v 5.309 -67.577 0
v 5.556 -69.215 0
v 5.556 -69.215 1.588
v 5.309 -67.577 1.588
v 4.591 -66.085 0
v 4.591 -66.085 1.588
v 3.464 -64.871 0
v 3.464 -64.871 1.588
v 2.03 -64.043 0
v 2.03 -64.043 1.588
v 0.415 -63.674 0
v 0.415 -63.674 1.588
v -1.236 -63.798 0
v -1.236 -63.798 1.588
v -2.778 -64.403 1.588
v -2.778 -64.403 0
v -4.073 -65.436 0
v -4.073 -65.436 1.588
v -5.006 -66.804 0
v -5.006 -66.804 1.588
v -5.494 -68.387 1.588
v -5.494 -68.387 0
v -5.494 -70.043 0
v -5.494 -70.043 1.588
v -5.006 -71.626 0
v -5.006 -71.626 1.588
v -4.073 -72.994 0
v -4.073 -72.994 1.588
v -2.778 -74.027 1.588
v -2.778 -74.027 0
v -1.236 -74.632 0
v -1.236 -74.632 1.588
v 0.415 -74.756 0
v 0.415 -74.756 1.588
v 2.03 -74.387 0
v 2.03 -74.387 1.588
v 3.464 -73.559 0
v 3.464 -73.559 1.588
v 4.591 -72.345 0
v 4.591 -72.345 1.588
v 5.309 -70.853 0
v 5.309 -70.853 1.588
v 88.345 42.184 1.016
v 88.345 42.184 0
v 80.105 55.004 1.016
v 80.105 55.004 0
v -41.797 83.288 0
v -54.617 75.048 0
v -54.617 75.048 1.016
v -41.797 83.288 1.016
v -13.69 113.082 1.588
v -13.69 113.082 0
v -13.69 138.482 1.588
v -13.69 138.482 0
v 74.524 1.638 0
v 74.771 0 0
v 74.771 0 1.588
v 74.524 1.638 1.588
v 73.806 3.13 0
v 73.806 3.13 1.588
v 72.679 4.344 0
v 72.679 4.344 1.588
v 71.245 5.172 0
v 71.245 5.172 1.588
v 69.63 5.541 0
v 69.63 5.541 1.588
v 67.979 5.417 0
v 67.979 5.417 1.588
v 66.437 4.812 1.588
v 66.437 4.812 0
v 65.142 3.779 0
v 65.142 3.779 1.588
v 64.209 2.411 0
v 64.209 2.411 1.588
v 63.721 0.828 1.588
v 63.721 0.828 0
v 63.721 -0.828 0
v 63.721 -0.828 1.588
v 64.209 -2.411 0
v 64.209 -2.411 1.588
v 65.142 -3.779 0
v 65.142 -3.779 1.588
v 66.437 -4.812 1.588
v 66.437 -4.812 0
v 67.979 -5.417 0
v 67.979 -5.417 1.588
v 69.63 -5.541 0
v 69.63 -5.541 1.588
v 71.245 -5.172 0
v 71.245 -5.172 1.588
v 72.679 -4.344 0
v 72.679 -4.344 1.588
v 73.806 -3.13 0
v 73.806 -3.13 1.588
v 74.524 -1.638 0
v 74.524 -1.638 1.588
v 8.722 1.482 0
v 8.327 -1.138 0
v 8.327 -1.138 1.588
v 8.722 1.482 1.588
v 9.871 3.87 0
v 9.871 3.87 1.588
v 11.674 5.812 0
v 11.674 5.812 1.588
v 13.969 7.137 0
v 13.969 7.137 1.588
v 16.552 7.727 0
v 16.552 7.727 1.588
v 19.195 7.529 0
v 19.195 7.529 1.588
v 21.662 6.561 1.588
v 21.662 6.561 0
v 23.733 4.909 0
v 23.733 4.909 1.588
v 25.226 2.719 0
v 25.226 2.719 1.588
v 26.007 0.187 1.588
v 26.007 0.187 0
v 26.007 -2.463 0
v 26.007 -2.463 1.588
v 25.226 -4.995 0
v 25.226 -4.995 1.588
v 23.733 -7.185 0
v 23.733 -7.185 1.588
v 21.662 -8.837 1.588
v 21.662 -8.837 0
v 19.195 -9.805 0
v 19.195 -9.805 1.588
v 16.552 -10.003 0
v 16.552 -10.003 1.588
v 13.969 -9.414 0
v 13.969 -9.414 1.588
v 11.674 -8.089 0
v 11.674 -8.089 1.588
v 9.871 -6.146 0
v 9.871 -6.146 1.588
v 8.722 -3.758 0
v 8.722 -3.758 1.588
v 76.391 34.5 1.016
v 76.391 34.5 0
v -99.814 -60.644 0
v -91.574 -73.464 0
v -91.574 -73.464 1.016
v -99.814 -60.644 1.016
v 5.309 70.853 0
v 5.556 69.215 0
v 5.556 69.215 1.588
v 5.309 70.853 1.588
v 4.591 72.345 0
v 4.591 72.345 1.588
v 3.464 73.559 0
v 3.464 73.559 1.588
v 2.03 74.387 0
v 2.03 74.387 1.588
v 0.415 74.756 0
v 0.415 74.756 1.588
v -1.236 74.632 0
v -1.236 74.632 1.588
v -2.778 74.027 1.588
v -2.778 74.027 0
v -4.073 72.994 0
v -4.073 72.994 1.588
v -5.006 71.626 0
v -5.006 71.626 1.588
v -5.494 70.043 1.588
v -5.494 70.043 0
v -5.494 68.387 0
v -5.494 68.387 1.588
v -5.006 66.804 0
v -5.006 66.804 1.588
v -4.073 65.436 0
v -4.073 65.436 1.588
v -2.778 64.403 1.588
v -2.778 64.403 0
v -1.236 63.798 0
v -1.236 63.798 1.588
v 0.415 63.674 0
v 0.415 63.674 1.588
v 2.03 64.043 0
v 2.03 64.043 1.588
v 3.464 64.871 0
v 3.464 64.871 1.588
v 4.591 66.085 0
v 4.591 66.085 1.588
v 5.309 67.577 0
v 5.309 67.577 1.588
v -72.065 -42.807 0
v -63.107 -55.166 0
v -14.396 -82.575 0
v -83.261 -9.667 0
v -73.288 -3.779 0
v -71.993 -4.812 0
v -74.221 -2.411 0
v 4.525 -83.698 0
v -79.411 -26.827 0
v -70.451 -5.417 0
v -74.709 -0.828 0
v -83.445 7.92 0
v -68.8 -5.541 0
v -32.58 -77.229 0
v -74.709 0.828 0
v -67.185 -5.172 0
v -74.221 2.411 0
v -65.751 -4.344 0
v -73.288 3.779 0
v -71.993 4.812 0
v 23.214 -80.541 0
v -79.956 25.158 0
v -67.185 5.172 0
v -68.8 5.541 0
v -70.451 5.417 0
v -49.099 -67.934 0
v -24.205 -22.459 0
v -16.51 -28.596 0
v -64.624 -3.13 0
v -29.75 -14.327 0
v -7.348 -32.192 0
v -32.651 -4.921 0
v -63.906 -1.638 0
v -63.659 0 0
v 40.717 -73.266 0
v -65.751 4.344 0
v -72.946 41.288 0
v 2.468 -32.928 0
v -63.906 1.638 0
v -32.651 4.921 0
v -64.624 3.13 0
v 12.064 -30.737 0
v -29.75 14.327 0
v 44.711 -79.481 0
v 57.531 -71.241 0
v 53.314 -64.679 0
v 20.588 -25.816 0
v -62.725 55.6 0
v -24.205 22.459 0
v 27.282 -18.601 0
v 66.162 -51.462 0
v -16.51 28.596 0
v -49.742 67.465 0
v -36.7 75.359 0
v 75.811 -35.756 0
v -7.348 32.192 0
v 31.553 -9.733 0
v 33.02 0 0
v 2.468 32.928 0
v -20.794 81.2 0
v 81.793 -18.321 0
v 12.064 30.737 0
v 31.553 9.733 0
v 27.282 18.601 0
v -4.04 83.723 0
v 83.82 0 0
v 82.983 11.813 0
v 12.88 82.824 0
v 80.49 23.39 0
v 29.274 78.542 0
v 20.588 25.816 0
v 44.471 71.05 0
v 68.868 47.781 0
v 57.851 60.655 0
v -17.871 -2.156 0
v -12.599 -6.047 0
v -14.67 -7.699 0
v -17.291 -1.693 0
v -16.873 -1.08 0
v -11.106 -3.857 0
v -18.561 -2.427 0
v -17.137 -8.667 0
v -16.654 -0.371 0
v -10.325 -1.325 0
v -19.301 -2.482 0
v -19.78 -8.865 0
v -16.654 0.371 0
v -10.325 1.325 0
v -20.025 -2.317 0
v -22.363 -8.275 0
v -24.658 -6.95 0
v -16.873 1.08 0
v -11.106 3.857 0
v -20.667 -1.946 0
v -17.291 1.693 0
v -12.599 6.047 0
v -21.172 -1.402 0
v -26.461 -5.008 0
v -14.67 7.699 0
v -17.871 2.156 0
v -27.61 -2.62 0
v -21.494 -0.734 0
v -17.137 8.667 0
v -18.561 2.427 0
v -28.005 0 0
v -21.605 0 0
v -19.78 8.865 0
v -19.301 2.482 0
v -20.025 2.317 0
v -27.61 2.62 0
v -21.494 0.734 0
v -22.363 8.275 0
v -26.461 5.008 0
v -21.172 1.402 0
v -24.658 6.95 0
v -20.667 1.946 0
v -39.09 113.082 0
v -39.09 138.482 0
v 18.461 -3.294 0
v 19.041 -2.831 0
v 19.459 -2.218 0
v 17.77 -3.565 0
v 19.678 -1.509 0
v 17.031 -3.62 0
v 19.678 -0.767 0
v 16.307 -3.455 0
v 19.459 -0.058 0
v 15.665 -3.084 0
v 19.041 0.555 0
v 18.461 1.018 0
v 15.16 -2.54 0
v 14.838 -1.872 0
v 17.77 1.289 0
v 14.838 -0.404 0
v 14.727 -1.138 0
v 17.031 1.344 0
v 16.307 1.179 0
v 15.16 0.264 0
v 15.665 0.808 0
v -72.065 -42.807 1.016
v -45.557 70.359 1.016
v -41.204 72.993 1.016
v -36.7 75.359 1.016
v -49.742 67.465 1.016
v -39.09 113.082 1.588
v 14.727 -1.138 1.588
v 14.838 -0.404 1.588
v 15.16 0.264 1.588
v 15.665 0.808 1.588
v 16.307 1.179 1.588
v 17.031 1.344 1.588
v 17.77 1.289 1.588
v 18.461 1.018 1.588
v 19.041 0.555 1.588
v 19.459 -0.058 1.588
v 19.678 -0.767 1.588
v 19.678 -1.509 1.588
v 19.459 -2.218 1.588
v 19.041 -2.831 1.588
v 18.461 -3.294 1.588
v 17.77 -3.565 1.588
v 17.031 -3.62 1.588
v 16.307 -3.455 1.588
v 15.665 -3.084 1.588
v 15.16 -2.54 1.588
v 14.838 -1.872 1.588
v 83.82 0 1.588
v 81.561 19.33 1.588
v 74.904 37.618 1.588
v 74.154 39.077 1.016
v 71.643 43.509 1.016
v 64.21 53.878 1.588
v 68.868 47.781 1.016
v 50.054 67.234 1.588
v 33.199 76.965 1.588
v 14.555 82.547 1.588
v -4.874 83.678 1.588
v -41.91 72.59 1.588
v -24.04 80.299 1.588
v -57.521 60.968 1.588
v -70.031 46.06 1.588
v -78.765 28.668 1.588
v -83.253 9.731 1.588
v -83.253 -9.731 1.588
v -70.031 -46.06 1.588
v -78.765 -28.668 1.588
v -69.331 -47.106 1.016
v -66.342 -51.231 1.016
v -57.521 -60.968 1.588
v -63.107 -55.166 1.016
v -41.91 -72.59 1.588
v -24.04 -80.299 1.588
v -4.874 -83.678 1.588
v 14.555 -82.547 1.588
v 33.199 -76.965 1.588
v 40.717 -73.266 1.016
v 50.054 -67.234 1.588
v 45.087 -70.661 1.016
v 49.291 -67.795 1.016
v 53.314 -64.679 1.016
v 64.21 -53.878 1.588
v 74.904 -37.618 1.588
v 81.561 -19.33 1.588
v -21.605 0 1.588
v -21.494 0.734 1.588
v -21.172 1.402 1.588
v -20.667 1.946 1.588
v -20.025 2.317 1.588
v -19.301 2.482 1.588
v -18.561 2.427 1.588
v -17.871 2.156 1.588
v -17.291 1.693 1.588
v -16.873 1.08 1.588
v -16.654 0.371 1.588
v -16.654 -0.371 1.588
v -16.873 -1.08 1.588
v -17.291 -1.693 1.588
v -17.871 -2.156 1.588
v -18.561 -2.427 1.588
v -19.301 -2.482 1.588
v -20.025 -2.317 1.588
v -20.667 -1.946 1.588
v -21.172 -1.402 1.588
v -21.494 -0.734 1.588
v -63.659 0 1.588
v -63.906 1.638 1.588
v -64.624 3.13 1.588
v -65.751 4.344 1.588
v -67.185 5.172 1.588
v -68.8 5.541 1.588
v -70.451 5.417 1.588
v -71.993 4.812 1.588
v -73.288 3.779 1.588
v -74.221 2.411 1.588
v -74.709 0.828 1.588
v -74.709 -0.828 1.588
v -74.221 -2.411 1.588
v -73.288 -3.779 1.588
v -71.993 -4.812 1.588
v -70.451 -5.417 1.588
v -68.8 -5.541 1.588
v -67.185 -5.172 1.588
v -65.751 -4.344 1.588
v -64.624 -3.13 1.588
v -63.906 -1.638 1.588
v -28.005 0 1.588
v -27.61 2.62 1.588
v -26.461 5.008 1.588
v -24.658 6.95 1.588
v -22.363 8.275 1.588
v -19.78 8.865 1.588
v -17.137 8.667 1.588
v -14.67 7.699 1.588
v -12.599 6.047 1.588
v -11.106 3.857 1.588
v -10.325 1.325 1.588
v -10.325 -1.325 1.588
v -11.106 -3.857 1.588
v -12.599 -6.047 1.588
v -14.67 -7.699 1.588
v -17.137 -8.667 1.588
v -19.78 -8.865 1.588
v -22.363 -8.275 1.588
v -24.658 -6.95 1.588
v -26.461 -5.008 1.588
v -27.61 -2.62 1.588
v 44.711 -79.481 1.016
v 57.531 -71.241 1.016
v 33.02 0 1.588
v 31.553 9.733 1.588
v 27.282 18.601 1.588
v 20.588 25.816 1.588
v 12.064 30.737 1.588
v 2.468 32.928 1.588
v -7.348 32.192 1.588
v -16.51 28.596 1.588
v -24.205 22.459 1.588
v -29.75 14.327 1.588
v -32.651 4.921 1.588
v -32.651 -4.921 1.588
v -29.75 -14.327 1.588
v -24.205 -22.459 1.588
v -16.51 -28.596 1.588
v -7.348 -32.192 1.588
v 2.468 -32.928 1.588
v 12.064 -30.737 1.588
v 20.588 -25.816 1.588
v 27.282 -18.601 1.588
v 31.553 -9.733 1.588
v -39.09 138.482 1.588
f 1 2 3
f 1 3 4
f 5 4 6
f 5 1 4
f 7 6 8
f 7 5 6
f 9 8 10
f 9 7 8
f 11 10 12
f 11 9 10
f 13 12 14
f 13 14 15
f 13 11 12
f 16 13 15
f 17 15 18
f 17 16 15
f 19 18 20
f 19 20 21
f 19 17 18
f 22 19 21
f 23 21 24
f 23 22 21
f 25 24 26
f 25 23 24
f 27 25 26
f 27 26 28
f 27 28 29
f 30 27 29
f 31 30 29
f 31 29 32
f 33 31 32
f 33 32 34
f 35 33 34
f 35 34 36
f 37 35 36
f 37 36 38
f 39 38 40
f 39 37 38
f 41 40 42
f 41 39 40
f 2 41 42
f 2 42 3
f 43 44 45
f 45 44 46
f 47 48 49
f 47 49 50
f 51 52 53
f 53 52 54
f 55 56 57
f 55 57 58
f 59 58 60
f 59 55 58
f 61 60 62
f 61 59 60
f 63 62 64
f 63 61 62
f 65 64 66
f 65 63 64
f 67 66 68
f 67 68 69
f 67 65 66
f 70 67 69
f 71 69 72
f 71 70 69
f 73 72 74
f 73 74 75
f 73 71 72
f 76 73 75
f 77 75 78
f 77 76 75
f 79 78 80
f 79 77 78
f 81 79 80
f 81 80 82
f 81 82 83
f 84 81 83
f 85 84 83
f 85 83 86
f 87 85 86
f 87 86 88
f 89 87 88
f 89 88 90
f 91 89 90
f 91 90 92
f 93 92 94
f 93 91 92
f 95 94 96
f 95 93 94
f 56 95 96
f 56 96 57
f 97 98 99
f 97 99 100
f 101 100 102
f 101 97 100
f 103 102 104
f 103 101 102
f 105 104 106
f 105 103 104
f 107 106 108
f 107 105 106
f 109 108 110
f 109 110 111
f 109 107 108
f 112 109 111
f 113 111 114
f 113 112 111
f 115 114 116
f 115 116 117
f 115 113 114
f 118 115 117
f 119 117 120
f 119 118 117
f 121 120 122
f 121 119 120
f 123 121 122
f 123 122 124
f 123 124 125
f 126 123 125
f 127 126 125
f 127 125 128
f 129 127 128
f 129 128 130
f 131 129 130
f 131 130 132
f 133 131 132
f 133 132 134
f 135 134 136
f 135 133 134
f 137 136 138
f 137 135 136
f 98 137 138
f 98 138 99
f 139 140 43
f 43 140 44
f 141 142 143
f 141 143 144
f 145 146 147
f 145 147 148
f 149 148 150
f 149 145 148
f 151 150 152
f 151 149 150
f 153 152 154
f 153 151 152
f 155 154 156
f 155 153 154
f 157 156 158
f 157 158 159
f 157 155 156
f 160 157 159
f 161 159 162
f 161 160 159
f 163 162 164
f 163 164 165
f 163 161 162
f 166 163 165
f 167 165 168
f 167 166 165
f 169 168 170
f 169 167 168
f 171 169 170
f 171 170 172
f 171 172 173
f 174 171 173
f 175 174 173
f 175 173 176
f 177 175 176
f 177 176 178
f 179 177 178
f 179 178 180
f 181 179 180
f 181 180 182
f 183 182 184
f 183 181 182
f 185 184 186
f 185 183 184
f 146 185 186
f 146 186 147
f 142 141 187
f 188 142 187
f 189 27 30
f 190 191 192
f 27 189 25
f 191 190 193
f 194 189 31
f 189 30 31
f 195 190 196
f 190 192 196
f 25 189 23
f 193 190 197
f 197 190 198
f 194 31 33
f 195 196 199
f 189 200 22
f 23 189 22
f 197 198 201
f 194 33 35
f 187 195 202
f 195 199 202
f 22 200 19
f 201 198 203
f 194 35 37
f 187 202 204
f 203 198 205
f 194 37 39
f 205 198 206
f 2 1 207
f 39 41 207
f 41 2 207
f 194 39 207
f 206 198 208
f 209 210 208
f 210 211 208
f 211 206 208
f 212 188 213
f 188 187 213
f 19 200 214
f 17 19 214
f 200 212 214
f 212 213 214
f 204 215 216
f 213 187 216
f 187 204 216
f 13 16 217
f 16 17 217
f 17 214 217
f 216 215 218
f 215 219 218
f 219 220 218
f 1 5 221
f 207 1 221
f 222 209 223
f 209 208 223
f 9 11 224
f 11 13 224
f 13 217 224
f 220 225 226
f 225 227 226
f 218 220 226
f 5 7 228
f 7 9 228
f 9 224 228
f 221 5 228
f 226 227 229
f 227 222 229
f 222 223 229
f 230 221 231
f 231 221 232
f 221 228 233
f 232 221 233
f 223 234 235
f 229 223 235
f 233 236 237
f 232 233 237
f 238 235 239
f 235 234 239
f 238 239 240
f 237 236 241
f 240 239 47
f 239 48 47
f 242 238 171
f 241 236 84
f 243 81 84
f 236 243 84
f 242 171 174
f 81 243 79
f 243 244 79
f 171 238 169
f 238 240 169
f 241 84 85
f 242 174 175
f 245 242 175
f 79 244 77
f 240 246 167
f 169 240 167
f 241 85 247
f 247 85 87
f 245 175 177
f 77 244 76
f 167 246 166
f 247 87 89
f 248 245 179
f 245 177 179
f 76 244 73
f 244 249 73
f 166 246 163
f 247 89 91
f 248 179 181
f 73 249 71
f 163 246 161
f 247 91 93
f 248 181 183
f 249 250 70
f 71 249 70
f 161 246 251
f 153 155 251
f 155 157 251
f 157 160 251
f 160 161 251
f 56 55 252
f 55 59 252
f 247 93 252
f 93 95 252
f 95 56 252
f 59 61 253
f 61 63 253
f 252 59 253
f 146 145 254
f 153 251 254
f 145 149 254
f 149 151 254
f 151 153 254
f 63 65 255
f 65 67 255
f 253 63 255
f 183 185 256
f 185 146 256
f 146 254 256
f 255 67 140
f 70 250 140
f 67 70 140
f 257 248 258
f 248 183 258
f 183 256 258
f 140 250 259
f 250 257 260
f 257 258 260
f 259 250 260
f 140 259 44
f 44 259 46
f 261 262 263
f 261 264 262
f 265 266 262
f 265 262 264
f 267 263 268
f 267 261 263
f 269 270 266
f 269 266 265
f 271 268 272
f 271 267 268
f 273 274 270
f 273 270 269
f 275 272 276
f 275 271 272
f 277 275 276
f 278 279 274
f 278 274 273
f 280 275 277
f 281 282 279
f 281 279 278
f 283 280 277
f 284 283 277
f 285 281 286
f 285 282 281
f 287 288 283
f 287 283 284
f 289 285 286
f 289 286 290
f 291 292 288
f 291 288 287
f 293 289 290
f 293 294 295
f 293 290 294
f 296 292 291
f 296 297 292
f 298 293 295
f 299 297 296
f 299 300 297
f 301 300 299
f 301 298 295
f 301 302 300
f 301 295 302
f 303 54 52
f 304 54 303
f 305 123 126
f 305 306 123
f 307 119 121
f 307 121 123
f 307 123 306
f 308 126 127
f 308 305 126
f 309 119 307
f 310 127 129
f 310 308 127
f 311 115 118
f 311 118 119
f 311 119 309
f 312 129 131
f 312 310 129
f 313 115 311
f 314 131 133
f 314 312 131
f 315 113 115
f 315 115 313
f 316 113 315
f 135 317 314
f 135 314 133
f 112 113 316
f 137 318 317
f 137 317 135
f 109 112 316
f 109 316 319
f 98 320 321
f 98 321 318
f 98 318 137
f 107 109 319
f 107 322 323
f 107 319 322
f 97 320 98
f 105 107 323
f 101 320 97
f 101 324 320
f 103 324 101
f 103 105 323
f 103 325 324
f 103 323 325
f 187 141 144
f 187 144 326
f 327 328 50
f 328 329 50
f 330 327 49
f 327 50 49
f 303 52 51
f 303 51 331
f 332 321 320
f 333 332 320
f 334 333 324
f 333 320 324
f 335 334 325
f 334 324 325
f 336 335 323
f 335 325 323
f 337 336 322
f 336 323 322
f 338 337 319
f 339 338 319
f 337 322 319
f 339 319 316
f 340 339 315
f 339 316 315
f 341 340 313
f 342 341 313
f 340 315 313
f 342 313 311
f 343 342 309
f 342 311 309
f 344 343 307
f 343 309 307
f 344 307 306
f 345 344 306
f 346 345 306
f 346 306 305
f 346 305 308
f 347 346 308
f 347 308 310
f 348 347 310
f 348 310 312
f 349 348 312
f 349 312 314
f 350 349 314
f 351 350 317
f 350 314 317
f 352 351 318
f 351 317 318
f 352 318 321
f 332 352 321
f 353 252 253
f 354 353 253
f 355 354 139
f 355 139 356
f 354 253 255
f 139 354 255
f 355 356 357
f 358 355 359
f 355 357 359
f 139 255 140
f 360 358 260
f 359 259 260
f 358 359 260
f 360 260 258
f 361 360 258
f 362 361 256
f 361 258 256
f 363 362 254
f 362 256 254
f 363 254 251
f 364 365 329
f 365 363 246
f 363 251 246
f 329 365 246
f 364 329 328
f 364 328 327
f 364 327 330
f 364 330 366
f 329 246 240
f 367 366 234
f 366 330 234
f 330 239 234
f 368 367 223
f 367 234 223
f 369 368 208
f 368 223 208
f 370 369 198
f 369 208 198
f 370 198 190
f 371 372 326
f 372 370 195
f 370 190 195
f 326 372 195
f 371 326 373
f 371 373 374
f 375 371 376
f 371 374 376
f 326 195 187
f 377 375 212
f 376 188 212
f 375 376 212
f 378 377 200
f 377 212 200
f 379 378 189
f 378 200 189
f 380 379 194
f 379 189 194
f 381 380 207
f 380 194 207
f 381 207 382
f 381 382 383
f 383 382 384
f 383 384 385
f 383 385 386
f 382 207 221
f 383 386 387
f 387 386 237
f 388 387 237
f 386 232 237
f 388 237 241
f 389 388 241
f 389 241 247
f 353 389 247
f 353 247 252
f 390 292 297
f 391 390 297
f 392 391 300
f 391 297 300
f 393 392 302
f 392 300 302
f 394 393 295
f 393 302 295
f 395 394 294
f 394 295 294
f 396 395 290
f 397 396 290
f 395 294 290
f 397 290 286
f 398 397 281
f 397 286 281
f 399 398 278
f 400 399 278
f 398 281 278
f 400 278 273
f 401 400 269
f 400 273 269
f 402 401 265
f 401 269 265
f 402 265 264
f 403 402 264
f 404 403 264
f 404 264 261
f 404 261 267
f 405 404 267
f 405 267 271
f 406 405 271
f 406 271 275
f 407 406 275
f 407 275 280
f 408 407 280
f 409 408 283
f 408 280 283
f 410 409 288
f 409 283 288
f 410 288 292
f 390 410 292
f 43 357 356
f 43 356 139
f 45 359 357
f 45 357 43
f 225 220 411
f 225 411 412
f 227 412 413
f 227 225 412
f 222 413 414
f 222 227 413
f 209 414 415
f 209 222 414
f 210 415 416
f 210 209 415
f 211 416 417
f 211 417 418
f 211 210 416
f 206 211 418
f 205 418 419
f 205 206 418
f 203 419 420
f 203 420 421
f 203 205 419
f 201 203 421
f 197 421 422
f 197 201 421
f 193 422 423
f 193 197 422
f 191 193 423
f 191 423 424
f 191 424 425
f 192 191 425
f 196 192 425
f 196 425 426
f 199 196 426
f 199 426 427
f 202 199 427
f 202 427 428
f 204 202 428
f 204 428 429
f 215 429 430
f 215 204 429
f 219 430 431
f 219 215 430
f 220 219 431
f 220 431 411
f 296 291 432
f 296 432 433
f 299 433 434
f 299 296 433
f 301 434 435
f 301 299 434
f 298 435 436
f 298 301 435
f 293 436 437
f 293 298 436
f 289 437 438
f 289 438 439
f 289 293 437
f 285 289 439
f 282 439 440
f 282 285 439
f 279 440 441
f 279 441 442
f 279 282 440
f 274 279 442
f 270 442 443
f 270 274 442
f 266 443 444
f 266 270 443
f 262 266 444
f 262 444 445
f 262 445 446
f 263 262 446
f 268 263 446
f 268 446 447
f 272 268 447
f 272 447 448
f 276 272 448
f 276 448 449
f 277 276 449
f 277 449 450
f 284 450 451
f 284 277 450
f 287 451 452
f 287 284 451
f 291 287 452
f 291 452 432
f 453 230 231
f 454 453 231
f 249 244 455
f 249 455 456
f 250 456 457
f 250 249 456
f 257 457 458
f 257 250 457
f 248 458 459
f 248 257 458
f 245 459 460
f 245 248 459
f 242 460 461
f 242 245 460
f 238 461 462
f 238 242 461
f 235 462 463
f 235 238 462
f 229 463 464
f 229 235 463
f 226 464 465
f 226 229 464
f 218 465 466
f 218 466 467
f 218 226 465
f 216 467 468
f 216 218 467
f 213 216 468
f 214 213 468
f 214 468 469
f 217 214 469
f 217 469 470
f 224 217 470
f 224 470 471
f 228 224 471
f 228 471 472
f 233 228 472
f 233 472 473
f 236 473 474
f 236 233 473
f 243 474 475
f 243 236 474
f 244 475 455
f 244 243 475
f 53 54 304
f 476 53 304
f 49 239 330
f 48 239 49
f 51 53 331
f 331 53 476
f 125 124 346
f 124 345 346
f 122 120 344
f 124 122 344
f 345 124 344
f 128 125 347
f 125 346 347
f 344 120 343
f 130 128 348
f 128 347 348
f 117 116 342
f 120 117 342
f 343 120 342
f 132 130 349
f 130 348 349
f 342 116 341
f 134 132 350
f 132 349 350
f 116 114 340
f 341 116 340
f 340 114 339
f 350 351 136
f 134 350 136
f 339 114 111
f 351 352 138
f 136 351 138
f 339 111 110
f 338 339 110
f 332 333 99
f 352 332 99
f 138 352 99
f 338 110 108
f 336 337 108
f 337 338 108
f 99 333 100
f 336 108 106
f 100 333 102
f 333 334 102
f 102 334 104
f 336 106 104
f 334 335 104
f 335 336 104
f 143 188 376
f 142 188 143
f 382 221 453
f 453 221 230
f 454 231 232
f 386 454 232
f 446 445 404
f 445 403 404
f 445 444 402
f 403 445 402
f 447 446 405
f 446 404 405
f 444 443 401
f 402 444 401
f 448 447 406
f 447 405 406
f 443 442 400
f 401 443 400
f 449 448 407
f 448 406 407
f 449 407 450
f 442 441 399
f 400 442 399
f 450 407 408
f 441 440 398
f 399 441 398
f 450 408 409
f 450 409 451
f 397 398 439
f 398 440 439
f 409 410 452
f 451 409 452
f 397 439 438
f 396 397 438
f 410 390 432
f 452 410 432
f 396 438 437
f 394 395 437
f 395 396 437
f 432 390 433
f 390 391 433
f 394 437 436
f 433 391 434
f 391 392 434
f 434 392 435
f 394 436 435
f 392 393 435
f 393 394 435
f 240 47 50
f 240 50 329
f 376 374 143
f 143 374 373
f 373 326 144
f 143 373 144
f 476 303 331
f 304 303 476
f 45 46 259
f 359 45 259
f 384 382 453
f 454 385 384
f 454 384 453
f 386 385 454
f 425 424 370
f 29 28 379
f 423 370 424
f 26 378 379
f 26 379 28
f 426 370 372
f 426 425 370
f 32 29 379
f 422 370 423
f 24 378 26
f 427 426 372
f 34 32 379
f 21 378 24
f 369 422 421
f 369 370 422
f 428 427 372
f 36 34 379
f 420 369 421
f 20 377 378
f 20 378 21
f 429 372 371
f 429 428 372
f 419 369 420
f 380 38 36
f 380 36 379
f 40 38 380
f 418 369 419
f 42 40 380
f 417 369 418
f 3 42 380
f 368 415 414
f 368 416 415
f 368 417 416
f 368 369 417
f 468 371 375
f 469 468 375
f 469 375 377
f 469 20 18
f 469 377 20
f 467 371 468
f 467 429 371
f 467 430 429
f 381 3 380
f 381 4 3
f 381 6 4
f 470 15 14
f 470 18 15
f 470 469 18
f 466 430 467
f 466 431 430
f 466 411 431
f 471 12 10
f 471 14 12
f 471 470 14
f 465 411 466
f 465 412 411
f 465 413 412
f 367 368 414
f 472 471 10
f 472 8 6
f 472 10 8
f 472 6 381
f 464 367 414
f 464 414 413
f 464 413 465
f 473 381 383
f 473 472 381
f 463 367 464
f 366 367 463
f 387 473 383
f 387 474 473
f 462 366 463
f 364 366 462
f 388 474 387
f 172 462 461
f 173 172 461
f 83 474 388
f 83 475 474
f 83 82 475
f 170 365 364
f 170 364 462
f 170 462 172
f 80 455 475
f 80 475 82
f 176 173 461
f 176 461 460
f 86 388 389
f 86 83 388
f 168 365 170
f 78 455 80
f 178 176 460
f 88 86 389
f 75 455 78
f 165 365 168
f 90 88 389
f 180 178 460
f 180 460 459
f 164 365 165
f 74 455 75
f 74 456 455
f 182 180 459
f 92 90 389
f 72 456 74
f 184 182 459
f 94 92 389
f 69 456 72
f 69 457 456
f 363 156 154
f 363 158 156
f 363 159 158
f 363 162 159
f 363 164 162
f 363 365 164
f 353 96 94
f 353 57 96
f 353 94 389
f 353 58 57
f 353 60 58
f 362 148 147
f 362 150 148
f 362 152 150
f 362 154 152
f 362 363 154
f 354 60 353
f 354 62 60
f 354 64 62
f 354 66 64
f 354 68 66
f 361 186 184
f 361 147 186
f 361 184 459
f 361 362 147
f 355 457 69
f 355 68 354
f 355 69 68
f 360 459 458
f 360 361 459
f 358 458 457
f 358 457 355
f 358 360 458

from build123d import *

# Parameters (mm, degrees)
SKETCH1_R             = 83.82
SKETCH1_R_2           = 33.02
SKETCH1_R_3           = 5.55625
BOSS_EXTRUDE1_DEPTH   = 1.5875
SKETCH2_R             = 8.89
SKETCH2_R_2           = 2.4892
BOSS_EXTRUDE2_DEPTH   = 1.5875
BOSS_EXTRUDE2_2_DEPTH = 1.5875
SKETCH2_W             = 25.4
SKETCH2_H             = 25.4
BOSS_EXTRUDE2_3_DEPTH = 1.5875
BOSS_EXTRUDE3_DEPTH   = 1.016


with BuildPart() as part:
    # Sketch1 → Boss-Extrude1 (new body)
    with BuildSketch(Plane.XY):
        Circle(SKETCH1_R)
        Circle(SKETCH1_R_2, mode=Mode.SUBTRACT)
        with Locations((-69.215, 0)):
            Circle(SKETCH1_R_3, mode=Mode.SUBTRACT)
        with Locations((0, 69.215)):
            Circle(SKETCH1_R_3, mode=Mode.SUBTRACT)
        with Locations((69.215, 0)):
            Circle(SKETCH1_R_3, mode=Mode.SUBTRACT)
        with Locations((0, -69.215)):
            Circle(SKETCH1_R_3, mode=Mode.SUBTRACT)
    extrude(amount=BOSS_EXTRUDE1_DEPTH)

    # Sketch3 → Boss-Extrude3 (add)
    with BuildSketch(Plane(origin=(0, 0, 0), x_dir=(-1, 0, 0), z_dir=(0, 0, -1))):
        Polygon((-58.593320115, 41.177009755), (-66.833750418, 28.356989925), (-88.345434116, 42.184232984), (-80.105003814, 55.004252814), align=None)
        Polygon((-48.527799881, -57.23355717), (-35.707780052, -65.473987472), (-44.711245717, -79.481096826), (-57.531265547, -71.240666524), align=None)
        Polygon((31.358470606, 67.049221054), (44.178490436, 58.808790751), (54.616620118, 75.047873493), (41.796600289, 83.288303795), align=None)
        Polygon((53.90809534, -31.13645663), (45.667665037, -43.95647646), (91.57402841, -73.464089774), (99.814458712, -60.644069945), align=None)
    extrude(amount=-BOSS_EXTRUDE3_DEPTH)


with BuildPart() as body_2:
    # Sketch2 → Boss-Extrude2 (new body)
    with BuildSketch(Plane(origin=(0, 0, 0), x_dir=(-1, 0, 0), z_dir=(0, 0, -1))):
        with Locations((-17.216545313, -1.138038116)):
            Circle(SKETCH2_R)
        with Locations((-17.216545313, -1.138038116)):
            Circle(SKETCH2_R_2, mode=Mode.SUBTRACT)
    extrude(amount=-BOSS_EXTRUDE2_DEPTH)


with BuildPart() as body_3:
    # Sketch2 → Boss-Extrude2 2 (new body)
    with BuildSketch(Plane(origin=(0, 0, 0), x_dir=(-1, 0, 0), z_dir=(0, 0, -1))):
        with Locations((19.115371157, 0)):
            Circle(SKETCH2_R)
        with Locations((19.115371157, 0)):
            Circle(SKETCH2_R_2, mode=Mode.SUBTRACT)
    extrude(amount=-BOSS_EXTRUDE2_2_DEPTH)


with BuildPart() as body_4:
    # Sketch2 → Boss-Extrude2 3 (new body)
    with BuildSketch(Plane(origin=(0, 0, 0), x_dir=(-1, 0, 0), z_dir=(0, 0, -1))):
        with Locations((26.390137184, 125.782482189)):
            Rectangle(SKETCH2_W, SKETCH2_H)
    extrude(amount=-BOSS_EXTRUDE2_3_DEPTH)


solid = Compound([part.part, body_2.part, body_3.part, body_4.part])
